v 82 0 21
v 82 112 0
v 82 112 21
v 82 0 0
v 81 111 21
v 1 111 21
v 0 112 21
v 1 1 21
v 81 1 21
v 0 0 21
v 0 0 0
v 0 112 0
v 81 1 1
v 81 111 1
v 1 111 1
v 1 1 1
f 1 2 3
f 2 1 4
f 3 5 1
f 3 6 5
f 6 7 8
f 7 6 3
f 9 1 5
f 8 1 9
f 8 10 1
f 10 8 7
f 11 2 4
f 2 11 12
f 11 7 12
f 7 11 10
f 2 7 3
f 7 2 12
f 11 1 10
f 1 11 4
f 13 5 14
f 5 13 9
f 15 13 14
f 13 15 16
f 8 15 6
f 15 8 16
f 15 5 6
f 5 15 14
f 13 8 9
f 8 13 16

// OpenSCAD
height = 110;
width = 80;
depth = 20;
thickness = 1;
play = 0.4;
thumb_radius = 10;
$fn = 180;
part = 0;

if(part == 0) {
	difference() {
		cube([width + thickness * 2, height + thickness * 2, depth + thickness]);
		translate([thickness, thickness, thickness]) {
			cube([width, height, depth + 0.1]);
		}
	}
} else {
	translate([width + thickness * 2 + 10, 0, 0]) {
		difference() {
			cube([width + thickness * 4 + play * 2, height + thickness * 4 + play * 2, depth + thickness * 2]);
			translate([thickness, thickness, thickness]) {
				cube([width + thickness * 2 + play * 2, height + thickness * 2 + play * 2, depth + thickness + 0.1]);
			}
			translate([-0.1, thickness * 2 + height / 2, thickness * 2 + depth]) {
				rotate([0, 90, 0]) {
					cylinder(r=thumb_radius, h=thickness * 4 + play * 2 + width + 0.2);
				}
			}
		}
	}
}
